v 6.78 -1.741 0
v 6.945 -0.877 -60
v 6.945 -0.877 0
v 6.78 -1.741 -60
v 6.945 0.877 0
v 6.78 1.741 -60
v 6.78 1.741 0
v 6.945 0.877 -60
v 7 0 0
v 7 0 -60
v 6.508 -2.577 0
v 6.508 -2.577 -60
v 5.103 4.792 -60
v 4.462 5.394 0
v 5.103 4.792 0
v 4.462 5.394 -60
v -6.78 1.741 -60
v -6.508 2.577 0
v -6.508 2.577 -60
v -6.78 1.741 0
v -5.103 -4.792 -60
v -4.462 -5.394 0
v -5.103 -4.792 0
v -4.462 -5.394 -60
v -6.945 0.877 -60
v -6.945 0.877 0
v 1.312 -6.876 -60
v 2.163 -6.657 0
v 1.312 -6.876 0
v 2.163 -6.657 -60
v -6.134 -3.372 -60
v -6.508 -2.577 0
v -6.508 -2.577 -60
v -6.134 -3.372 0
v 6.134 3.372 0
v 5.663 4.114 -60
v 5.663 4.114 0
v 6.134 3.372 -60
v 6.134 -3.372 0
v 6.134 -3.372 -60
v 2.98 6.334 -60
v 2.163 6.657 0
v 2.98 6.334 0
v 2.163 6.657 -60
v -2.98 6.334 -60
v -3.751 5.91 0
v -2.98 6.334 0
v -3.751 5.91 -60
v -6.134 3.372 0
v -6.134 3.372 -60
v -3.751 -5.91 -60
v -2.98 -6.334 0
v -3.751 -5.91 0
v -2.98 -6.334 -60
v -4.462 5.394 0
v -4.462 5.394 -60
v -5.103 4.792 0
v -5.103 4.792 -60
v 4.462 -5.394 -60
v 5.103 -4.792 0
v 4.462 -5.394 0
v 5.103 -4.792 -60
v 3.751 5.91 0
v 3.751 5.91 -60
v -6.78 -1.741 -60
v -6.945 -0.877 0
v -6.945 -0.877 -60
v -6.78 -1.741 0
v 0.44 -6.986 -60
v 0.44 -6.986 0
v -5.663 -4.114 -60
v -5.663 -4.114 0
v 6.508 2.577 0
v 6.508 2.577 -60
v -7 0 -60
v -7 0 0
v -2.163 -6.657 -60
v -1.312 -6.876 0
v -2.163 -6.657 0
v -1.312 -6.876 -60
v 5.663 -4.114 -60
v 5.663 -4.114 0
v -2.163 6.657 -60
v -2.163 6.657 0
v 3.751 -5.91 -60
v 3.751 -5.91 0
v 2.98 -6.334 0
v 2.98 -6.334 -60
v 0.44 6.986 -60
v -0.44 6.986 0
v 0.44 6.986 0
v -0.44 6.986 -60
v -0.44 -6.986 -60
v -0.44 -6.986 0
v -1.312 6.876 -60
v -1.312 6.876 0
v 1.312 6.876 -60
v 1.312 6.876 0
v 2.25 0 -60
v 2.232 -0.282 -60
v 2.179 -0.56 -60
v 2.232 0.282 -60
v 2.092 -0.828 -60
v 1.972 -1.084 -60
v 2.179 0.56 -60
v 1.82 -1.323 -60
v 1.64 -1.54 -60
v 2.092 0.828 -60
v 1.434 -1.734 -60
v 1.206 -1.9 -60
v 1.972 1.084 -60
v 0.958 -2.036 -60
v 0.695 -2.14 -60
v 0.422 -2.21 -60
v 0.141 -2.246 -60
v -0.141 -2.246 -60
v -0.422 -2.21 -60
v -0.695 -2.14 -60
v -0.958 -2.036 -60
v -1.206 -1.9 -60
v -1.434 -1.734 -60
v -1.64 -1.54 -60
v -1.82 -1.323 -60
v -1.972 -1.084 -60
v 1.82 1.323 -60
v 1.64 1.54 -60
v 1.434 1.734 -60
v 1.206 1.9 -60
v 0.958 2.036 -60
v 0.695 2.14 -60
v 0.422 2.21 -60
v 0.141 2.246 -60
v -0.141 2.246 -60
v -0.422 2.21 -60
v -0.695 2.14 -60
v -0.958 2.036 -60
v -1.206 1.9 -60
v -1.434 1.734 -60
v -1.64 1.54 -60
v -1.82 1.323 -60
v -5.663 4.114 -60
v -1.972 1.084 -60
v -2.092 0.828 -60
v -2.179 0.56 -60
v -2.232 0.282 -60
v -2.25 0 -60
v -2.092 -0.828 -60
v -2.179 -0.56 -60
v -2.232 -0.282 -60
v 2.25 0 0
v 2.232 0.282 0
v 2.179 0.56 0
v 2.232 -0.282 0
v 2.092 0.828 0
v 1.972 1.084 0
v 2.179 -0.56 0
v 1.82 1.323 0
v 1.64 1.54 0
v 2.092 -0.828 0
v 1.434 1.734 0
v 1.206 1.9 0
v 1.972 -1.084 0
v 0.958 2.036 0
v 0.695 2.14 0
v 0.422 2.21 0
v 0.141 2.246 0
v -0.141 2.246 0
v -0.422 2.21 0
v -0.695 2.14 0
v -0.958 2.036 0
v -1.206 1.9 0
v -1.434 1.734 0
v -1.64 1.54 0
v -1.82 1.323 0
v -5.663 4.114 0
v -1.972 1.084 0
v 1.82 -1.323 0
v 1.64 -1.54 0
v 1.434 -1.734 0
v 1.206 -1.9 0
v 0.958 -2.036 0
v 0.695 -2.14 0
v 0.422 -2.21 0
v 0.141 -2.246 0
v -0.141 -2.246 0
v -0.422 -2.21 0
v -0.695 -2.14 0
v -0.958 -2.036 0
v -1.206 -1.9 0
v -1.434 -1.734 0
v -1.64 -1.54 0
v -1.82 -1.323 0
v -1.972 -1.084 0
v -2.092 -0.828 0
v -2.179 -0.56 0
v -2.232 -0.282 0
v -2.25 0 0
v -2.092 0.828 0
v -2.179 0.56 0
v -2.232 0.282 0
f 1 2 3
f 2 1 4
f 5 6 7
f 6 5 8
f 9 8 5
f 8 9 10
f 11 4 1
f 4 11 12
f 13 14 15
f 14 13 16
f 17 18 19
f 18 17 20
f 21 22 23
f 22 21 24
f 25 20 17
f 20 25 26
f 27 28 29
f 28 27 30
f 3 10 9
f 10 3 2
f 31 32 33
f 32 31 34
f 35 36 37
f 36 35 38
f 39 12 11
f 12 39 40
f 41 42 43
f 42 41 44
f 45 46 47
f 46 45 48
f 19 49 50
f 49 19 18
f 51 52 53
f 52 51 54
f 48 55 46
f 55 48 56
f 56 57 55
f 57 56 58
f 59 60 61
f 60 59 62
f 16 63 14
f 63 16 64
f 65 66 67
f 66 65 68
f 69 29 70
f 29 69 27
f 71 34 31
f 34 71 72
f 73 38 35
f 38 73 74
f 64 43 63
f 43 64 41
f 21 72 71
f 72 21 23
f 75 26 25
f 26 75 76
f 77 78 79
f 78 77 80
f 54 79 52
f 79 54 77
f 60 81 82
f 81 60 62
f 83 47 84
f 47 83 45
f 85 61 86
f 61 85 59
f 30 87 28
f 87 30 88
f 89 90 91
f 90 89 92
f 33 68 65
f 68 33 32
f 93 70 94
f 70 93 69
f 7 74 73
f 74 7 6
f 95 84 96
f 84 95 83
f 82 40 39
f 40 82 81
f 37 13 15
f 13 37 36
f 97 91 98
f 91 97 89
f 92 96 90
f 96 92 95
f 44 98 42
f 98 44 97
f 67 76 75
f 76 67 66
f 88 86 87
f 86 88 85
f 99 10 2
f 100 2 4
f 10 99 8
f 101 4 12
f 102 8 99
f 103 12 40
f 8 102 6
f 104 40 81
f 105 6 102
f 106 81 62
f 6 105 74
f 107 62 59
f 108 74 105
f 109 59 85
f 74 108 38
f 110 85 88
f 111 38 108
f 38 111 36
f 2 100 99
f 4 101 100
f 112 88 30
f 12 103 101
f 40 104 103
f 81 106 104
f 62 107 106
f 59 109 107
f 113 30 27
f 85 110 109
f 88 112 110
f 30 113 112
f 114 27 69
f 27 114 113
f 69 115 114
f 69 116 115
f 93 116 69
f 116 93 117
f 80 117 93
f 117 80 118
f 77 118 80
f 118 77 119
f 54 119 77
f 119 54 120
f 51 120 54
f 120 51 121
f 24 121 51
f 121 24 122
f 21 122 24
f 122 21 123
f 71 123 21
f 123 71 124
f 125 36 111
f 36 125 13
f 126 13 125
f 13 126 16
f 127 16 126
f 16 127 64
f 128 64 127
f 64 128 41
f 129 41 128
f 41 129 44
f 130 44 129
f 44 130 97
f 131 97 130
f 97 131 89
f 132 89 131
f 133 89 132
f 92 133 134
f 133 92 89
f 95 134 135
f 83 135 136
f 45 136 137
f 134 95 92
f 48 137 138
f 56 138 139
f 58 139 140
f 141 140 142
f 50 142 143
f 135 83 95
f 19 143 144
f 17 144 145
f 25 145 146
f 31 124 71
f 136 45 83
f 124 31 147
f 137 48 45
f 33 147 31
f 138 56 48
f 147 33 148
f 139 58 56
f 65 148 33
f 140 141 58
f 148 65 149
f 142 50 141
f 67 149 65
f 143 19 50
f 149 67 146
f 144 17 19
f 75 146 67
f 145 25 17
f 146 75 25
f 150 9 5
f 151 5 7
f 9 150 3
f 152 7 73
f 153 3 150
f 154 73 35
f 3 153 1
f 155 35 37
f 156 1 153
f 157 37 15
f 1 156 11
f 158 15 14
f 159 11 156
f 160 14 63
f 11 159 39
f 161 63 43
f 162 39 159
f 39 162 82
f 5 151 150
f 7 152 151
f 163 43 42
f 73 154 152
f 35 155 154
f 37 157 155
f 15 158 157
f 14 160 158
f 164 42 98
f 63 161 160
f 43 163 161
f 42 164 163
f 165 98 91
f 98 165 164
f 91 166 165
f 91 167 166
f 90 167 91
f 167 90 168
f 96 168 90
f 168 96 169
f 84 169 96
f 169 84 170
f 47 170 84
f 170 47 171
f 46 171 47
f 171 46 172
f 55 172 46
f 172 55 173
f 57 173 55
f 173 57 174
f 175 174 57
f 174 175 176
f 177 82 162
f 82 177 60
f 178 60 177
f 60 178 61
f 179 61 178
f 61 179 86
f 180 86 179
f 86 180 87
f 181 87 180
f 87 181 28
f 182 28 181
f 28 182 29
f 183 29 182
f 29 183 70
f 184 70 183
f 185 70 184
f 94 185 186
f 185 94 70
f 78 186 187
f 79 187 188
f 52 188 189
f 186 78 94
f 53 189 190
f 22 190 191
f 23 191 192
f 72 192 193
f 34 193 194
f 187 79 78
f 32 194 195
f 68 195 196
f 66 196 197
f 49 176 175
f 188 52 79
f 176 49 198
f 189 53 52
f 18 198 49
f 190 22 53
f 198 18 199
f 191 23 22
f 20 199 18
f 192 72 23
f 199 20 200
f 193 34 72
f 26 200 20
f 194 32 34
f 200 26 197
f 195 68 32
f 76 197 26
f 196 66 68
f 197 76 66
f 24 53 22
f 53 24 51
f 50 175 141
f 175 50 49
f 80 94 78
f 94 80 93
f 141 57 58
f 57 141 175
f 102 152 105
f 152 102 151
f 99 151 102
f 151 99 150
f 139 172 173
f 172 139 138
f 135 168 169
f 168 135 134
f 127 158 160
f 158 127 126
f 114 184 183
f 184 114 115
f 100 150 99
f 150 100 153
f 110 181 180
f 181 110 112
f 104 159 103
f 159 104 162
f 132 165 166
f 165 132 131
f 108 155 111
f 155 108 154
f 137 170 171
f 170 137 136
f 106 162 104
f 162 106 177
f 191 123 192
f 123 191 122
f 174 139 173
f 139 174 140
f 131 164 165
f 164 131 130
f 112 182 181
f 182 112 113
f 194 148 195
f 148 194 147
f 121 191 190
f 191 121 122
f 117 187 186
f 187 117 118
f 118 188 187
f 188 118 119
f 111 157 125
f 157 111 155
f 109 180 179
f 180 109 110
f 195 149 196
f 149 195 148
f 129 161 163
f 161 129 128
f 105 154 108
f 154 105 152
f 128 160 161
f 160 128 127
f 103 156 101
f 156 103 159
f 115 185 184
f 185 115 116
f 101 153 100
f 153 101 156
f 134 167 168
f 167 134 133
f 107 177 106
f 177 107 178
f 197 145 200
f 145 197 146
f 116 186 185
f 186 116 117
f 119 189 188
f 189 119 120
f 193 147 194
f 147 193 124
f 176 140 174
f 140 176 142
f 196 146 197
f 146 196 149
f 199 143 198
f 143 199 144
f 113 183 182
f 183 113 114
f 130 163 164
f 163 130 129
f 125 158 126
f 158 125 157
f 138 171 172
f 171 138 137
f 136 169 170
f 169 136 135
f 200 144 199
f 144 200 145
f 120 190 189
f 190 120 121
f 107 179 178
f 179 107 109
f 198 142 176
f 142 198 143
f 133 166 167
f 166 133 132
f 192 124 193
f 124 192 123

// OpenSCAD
$fn = 50;


difference() {
	union() {
		translate(v = [0, 0, -60.0000000000]) {
			cylinder(h = 60, r = 7.0000000000);
		}
		cylinder(h = 0, r = 10.0000000000);
	}
	union() {
		#translate(v = [0, 0, -60]) {
			cylinder(h = 60, r = 2.2500000000);
		}
	}
}
